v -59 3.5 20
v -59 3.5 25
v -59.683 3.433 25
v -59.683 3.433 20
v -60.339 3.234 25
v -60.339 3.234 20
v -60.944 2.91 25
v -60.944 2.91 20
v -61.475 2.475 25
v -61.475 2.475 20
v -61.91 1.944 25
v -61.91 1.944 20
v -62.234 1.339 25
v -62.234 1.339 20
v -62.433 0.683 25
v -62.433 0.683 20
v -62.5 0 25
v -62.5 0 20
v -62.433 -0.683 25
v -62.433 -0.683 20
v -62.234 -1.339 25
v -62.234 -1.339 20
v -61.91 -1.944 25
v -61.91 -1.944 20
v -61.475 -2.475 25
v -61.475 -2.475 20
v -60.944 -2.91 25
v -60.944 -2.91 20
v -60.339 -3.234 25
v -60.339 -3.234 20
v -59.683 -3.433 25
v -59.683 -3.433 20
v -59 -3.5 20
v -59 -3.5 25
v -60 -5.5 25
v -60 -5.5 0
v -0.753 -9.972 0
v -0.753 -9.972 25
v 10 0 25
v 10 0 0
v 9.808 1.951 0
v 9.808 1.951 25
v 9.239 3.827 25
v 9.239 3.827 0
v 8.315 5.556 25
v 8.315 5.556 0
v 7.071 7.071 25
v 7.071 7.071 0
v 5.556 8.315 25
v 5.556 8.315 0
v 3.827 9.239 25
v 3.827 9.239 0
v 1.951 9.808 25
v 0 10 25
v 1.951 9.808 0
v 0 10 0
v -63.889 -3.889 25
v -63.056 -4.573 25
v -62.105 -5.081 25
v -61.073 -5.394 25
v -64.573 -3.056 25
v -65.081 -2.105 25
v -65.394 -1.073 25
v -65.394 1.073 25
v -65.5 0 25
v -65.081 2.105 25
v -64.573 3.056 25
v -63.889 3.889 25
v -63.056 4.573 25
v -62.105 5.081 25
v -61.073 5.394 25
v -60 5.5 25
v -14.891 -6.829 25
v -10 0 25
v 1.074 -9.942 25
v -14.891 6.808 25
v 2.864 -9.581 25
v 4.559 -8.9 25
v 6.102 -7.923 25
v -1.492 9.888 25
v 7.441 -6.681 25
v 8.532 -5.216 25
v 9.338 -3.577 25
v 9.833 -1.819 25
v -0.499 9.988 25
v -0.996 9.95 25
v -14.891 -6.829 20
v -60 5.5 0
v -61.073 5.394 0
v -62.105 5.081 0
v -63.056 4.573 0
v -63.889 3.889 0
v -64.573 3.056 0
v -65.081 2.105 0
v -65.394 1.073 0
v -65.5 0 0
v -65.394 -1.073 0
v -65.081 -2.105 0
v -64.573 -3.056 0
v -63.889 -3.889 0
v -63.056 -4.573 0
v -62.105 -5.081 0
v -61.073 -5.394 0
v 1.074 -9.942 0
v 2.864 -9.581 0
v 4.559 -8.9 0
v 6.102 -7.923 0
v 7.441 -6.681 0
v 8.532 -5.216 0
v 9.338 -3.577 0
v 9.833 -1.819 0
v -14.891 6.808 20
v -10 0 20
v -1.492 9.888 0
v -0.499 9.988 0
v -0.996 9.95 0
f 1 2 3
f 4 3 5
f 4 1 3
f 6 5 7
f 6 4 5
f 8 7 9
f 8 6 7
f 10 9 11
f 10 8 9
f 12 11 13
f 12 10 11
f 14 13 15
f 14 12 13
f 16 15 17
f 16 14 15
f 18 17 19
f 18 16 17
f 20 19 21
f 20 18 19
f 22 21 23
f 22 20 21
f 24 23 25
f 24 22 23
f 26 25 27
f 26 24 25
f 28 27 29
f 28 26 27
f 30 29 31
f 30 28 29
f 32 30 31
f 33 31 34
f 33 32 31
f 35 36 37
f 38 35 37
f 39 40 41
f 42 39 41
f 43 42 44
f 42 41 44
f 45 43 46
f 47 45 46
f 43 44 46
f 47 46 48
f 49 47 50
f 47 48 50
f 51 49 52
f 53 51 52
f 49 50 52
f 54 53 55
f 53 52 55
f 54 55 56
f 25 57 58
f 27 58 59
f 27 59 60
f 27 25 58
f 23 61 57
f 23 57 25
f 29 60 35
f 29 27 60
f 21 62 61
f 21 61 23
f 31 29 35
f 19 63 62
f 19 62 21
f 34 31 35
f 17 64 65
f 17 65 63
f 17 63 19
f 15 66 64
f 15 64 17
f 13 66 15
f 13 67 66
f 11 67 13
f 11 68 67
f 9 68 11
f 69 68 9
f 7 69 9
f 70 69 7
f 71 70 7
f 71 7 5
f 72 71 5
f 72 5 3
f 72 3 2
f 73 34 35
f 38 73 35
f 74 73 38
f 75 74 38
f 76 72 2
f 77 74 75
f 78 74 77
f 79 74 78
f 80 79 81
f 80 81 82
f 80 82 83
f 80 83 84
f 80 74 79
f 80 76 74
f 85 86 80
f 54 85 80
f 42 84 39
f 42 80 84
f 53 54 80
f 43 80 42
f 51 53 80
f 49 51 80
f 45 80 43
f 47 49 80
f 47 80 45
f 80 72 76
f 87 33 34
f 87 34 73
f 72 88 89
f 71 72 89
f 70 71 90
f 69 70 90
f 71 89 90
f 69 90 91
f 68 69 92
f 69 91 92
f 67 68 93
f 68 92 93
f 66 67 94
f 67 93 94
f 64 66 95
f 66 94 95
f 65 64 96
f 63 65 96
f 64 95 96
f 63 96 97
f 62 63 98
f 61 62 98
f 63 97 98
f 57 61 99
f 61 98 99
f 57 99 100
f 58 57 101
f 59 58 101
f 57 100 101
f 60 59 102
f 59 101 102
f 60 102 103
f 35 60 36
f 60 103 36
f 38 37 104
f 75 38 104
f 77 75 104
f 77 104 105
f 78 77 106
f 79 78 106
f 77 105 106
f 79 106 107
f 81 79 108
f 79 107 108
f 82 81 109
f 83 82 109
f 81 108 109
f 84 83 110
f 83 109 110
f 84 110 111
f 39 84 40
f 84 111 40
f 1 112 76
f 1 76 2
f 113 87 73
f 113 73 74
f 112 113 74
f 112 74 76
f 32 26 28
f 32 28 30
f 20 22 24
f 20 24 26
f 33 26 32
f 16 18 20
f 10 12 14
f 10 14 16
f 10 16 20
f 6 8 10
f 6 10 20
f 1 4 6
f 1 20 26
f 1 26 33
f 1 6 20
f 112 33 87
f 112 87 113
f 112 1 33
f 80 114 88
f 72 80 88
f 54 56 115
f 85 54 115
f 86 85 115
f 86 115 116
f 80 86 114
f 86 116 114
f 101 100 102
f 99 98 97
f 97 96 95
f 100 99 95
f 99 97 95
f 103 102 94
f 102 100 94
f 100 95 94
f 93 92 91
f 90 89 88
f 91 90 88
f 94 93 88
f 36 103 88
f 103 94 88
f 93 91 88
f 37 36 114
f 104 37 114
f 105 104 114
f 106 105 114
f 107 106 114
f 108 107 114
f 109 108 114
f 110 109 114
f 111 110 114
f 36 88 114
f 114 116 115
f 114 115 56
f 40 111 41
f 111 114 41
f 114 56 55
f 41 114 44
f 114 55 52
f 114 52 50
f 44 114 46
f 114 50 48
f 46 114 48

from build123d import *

# Parameters (mm, degrees)
F0_R     = 7
F0_R_2   = 6
F1_DEPTH = 25
F3_START = 20
F3_DEPTH = 10


with BuildPart() as f1:
    # F0 (on Top) → F1 (new body)
    with BuildSketch(Plane.XY):
        with BuildLine():
            Line((-23.5798439344, -6.2340971038), (-10, 0))
            Line((-10, 0), (-23.5798439344, 6.2170174071))
            Line((-23.5798439344, 6.2170174071), (-59.8497580387, 3.4967738493))
            ThreePointArc((-59.8497580387, 3.4967738493), (-63.4999999675, -0.0004767763), (-59.8488053705, -3.496732787))
            Line((-59.8488053705, -3.496732787), (-23.5798439344, -6.2340971038))
        make_face()
        with BuildLine():
            ThreePointArc((-0.7525998222, -9.9716394594), (6.7997794735, -7.3323256277), (10, 0))
            ThreePointArc((10, 0), (7.0710678119, 7.0710678119), (0, 10))
            Line((0, 10), (-1.4916096955, 9.8881292728))
            ThreePointArc((-1.4916096955, 9.8881292728), (-4.2331341707, 9.059833061), (-6.6274556663, 7.4884465272))
            ThreePointArc((-6.6274556663, 7.4884465272), (-9.1179645937, 4.1064244384), (-10, 0))
            ThreePointArc((-10, 0), (-9.1094152791, -4.125354927), (-6.5962893453, -7.5159142407))
            ThreePointArc((-6.5962893453, -7.5159142407), (-3.8741695351, -9.2190460685), (-0.7525998222, -9.9716394594))
        make_face()
        Circle(F0_R, mode=Mode.SUBTRACT)
        Circle(F0_R)
        Circle(F0_R_2, mode=Mode.SUBTRACT)
        Circle(F0_R_2)
        with BuildLine():
            Line((-60, -5.5), (-0.7525998222, -9.9716394594))
            ThreePointArc((-0.7525998222, -9.9716394594), (-3.8741695351, -9.2190460685), (-6.5962893453, -7.5159142407))
            Line((-6.5962893453, -7.5159142407), (-23.5798439344, -6.2340971038))
            Line((-23.5798439344, -6.2340971038), (-59.8488053705, -3.496732787))
            Line((-59.8488053705, -3.496732787), (-60, -5.5))
        make_face()
        with BuildLine():
            ThreePointArc((-6.6274556663, 7.4884465272), (-4.2331341707, 9.059833061), (-1.4916096955, 9.8881292728))
            Line((-1.4916096955, 9.8881292728), (-60, 5.5))
            Line((-60, 5.5), (-59.8497580387, 3.4967738493))
            Line((-59.8497580387, 3.4967738493), (-23.5798439344, 6.2170174071))
            Line((-23.5798439344, 6.2170174071), (-6.6274556663, 7.4884465272))
        make_face()
        with BuildLine():
            Line((-23.5798439344, -6.2340971038), (-6.5962893453, -7.5159142407))
            ThreePointArc((-6.5962893453, -7.5159142407), (-9.1094152791, -4.125354927), (-10, 0))
            Line((-10, 0), (-23.5798439344, -6.2340971038))
        make_face()
        with BuildLine():
            ThreePointArc((-10, 0), (-9.1179645937, 4.1064244384), (-6.6274556663, 7.4884465272))
            Line((-6.6274556663, 7.4884465272), (-23.5798439344, 6.2170174071))
            Line((-23.5798439344, 6.2170174071), (-10, 0))
        make_face()
        with BuildLine():
            ThreePointArc((-60, 5.5), (-65.5, 0), (-60, -5.5))
            Line((-60, -5.5), (-59.8488053705, -3.496732787))
            ThreePointArc((-59.8488053705, -3.496732787), (-63.4999999675, -0.0004767763), (-59.8497580387, 3.4967738493))
            Line((-59.8497580387, 3.4967738493), (-60, 5.5))
        make_face()
        with BuildLine():
            Line((-1.4916096955, 9.8881292728), (0, 10))
            ThreePointArc((0, 10), (-0.7478994824, 9.9719930989), (-1.4916096955, 9.8881292728))
        make_face()
    extrude(amount=F1_DEPTH)

    # F2 (on Top) → F3 (cut)
    with BuildSketch(Plane.XY.offset(F3_START)):
        with BuildLine():
            ThreePointArc((-59, 3.5), (-56.5251262658, 2.4748737342), (-55.5, 0))
            ThreePointArc((-55.5, 0), (-56.5251262658, -2.4748737342), (-59, -3.5))
            Line((-59, -3.5), (-14.8914183851, -6.8290519661))
            Line((-14.8914183851, -6.8290519661), (-10, 0))
            Line((-10, 0), (-14.8914183851, 6.8081436211))
            Line((-14.8914183851, 6.8081436211), (-59, 3.5))
        make_face()
        with BuildLine():
            ThreePointArc((-59, -3.5), (-56.5251262658, -2.4748737342), (-55.5, 0))
            ThreePointArc((-55.5, 0), (-56.5251262658, 2.4748737342), (-59, 3.5))
            ThreePointArc((-59, 3.5), (-62.5, 0), (-59, -3.5))
        make_face()
    extrude(amount=F3_DEPTH, mode=Mode.SUBTRACT)


solid = f1.part
